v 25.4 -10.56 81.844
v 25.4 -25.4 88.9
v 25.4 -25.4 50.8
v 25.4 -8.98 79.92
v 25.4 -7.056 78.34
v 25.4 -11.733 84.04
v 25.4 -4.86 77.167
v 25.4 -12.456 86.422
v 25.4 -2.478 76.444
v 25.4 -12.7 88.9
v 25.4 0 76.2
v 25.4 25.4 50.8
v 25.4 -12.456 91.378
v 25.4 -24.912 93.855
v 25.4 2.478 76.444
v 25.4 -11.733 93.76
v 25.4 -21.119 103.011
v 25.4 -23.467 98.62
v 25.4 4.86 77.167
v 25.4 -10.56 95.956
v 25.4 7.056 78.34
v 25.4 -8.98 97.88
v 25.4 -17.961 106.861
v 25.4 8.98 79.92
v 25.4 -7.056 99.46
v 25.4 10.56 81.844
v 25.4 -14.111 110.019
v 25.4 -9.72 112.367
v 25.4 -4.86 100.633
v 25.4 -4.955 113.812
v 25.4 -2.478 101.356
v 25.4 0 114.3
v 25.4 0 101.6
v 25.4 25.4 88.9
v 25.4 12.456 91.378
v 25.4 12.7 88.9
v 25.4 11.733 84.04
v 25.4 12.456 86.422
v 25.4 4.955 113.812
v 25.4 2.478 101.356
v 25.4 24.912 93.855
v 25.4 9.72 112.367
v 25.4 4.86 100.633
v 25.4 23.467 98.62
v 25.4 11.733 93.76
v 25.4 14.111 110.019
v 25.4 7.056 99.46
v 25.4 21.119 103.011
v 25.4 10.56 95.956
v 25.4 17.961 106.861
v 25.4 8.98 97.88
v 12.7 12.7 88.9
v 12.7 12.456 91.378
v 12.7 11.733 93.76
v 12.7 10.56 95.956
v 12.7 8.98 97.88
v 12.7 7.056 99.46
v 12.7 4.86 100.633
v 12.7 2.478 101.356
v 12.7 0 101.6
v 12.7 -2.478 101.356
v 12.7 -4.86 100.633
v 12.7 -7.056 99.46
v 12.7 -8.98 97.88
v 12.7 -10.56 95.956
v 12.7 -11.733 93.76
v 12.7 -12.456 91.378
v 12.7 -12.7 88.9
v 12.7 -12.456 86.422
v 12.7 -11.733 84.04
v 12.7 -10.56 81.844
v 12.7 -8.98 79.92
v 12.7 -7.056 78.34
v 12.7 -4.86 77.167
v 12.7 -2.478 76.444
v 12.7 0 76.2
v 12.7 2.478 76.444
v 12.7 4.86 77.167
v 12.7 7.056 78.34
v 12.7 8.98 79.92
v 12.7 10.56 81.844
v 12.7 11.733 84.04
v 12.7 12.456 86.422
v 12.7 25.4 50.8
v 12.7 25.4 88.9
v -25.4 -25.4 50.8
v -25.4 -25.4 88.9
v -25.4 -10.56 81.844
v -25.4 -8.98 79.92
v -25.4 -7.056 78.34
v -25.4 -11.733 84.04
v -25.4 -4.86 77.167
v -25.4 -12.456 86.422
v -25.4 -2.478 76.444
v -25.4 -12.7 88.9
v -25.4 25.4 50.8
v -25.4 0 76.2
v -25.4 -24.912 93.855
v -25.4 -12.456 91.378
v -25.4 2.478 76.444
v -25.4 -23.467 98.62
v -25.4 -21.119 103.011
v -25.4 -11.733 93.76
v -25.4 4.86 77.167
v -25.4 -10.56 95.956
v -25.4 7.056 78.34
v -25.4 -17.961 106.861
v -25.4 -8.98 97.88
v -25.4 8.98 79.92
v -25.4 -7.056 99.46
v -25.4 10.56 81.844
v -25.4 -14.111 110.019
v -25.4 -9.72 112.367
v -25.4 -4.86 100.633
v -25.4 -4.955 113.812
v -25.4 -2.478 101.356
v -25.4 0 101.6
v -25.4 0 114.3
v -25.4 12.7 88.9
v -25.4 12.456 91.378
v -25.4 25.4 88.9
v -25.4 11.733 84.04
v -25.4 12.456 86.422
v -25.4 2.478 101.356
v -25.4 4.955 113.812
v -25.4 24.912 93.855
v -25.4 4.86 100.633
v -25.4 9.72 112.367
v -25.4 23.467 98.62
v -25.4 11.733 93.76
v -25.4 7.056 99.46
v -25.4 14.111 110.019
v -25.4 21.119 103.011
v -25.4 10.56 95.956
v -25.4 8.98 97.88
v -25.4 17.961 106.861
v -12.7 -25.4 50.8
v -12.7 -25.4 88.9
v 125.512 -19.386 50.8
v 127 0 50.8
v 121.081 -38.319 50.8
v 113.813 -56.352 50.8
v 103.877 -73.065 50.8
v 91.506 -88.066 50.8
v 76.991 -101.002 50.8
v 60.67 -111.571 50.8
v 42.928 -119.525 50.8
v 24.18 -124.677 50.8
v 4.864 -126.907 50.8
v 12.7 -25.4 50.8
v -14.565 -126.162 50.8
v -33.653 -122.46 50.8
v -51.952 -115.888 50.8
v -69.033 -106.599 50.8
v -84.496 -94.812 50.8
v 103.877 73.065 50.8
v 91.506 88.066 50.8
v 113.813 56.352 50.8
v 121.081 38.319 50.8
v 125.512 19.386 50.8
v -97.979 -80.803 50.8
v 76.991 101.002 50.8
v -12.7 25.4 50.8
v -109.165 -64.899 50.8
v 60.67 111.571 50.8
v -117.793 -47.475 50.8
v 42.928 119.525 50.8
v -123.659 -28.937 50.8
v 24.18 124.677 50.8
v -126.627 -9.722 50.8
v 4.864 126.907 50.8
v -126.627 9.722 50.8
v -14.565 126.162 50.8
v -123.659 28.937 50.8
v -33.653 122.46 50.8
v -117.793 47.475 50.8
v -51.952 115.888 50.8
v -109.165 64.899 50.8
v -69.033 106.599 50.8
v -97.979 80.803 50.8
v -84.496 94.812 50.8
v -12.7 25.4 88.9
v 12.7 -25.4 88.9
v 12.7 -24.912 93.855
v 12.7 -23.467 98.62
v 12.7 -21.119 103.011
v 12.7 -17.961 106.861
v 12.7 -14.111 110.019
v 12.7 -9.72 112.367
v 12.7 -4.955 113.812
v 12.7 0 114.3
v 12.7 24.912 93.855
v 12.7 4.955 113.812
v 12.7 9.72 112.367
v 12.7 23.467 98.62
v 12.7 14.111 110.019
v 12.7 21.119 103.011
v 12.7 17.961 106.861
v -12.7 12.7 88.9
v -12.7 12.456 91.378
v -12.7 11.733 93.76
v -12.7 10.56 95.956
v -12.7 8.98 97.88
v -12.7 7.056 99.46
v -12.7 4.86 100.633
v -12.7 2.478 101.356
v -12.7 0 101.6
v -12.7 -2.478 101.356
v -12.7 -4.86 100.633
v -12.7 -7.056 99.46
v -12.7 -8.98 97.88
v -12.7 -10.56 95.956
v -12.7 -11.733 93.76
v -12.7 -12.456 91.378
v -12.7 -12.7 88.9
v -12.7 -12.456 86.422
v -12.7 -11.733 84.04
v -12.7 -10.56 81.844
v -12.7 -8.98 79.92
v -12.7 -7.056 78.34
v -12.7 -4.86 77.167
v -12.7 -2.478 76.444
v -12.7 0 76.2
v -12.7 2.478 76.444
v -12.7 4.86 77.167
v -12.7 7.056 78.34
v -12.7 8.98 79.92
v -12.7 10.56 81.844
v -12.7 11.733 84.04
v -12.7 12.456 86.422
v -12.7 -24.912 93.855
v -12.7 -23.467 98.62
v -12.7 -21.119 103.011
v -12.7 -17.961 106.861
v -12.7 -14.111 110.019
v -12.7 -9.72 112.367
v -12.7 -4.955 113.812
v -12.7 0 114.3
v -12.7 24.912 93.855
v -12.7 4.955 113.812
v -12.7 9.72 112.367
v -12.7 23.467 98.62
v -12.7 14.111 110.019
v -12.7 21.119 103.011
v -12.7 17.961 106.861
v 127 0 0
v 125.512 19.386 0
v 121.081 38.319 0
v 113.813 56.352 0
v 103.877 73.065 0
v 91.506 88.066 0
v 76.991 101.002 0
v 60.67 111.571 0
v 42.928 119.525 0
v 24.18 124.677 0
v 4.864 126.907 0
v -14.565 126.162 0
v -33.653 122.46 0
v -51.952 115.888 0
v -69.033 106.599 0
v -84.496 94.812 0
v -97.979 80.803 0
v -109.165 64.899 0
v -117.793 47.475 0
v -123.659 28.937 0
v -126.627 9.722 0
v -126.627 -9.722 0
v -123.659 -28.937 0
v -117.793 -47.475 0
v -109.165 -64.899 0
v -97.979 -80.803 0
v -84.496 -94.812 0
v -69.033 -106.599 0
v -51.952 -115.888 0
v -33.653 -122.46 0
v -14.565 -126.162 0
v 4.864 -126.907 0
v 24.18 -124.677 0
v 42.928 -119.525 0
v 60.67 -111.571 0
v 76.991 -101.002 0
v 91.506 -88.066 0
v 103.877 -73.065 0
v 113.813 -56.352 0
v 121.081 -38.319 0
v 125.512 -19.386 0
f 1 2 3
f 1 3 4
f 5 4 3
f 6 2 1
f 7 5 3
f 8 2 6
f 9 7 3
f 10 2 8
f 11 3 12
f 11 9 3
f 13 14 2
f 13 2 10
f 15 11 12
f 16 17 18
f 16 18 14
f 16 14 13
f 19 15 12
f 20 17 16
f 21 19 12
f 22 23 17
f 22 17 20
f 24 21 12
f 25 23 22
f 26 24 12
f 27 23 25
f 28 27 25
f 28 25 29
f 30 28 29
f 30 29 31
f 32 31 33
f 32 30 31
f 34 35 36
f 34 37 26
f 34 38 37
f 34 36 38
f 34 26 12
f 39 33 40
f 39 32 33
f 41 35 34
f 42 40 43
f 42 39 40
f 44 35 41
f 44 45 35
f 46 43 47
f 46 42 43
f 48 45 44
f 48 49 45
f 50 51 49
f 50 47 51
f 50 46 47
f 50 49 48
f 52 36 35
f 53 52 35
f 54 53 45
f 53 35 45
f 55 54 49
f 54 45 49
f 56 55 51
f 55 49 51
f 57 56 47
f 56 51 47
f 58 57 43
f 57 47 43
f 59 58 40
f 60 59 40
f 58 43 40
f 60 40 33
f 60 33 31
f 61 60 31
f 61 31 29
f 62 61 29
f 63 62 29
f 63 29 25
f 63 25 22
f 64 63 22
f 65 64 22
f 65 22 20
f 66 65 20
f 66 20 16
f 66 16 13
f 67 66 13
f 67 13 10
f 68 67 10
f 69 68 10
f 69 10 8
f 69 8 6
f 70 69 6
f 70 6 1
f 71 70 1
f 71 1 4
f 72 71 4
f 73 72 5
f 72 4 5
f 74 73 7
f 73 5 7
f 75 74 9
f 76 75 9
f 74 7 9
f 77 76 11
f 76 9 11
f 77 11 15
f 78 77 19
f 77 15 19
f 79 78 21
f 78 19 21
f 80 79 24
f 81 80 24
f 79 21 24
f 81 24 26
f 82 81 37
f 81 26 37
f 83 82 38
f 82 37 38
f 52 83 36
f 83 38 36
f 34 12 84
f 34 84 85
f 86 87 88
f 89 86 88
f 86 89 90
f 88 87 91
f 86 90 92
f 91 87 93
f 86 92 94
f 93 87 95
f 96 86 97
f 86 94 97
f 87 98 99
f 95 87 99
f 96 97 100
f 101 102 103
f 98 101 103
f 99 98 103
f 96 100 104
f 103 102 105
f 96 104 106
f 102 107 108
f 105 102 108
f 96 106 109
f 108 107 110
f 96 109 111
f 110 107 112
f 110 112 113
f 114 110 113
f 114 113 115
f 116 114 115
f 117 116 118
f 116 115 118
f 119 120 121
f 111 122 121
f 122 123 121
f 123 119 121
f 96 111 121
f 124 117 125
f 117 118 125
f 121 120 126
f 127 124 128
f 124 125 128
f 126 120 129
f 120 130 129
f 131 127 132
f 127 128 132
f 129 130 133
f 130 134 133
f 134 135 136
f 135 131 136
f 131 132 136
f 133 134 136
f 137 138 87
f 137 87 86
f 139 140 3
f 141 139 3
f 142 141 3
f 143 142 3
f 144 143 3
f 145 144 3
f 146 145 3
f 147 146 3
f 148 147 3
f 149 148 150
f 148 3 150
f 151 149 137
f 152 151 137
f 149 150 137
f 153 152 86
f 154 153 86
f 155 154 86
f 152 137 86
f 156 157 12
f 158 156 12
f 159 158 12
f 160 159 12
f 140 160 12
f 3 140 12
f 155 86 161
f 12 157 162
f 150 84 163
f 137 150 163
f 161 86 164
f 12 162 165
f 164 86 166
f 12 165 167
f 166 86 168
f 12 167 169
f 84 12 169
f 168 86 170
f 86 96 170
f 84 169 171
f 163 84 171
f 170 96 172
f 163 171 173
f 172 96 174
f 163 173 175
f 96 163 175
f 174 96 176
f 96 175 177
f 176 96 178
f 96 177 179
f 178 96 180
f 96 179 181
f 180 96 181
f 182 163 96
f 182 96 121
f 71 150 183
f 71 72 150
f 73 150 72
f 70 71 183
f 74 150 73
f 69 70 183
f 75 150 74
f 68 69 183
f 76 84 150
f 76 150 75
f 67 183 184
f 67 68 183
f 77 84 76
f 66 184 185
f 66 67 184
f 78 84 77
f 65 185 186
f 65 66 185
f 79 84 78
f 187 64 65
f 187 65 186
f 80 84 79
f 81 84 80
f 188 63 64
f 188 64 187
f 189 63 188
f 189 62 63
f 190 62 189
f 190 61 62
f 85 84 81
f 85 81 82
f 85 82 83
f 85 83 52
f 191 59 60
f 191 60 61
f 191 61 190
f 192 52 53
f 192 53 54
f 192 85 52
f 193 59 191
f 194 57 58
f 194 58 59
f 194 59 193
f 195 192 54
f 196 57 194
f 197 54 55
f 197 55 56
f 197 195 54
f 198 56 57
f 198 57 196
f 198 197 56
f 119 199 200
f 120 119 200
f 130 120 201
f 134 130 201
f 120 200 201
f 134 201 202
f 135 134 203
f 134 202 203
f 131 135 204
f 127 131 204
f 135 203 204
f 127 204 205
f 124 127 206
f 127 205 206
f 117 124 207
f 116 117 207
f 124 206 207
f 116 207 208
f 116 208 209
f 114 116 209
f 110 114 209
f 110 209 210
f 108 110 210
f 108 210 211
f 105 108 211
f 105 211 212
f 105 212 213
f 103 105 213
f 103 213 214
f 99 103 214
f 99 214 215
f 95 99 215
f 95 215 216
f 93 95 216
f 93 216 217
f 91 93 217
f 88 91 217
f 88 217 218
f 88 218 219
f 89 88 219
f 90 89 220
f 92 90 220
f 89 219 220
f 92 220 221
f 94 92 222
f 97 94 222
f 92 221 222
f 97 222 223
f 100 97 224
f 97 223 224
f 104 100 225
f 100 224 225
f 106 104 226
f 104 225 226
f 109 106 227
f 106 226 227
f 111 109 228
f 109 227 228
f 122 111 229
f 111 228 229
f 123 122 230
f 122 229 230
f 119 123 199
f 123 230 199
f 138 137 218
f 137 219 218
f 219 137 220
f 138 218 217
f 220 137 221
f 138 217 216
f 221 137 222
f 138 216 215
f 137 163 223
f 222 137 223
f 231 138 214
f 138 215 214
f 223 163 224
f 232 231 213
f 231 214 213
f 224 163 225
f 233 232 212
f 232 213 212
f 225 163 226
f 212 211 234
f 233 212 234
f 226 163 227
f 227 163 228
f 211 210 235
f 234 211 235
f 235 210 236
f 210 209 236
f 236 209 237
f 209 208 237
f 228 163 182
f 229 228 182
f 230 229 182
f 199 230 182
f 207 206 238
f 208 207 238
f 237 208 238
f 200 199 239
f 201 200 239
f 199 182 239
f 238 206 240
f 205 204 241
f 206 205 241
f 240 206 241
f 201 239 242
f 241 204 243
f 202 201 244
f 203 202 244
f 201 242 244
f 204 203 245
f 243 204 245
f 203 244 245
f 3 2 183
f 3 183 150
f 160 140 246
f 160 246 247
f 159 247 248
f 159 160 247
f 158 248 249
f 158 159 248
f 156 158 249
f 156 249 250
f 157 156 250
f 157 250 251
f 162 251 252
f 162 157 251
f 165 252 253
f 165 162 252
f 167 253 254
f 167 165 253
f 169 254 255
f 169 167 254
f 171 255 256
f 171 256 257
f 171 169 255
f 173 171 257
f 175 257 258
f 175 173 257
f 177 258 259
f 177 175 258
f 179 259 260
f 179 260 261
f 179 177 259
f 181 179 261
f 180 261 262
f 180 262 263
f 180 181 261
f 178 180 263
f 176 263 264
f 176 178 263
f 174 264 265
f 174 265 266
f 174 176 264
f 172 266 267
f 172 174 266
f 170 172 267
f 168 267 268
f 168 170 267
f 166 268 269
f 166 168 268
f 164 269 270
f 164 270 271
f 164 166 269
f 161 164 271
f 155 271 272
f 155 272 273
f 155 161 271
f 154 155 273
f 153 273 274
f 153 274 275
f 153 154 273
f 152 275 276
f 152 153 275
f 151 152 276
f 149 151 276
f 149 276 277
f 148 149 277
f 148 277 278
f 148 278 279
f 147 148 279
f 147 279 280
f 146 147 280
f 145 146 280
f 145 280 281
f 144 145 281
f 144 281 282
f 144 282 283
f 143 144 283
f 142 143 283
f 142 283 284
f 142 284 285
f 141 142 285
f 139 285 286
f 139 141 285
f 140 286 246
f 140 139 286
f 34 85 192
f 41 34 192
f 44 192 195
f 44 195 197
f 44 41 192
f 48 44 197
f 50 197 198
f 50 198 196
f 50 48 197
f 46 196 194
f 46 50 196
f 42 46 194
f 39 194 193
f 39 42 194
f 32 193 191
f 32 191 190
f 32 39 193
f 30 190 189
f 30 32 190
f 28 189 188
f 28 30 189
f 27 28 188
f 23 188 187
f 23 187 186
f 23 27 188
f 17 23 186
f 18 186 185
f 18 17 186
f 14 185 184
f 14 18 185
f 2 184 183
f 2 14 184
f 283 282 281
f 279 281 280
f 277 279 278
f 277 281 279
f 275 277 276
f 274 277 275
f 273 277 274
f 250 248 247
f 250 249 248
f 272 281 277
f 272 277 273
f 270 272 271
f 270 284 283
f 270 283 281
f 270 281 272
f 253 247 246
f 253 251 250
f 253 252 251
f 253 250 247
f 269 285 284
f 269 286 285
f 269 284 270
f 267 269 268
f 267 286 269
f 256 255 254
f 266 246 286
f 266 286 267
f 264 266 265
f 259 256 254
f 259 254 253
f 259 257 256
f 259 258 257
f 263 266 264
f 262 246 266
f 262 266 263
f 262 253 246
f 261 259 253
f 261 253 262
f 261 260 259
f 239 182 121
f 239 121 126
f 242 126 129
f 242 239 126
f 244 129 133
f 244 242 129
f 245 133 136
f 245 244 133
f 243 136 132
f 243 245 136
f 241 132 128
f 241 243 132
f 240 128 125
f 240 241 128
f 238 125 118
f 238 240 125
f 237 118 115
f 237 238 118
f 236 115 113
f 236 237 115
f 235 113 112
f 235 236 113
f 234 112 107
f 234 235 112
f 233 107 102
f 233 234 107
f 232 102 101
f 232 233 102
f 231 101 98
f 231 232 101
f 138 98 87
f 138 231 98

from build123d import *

# Parameters (mm, degrees)
F0_W     = 127
F0_H     = 50.8
F3_DEPTH = 25.4
F4_W     = 25.4
F4_H     = 101.6
F5_DEPTH = 152.401
F6_R     = 12.7
F7_DEPTH = 152.401


with BuildPart() as f1:
    # F0 (on Front) → F1 (revolve)
    with BuildSketch(Plane.XZ):
        with Locations((63.5, 25.4)):
            Rectangle(F0_W, F0_H)
    revolve(axis=Axis((0, 0, 25.4), (0, 0, 1)))

    # F2 (on Right) → F3 (join, symmetric)
    with BuildSketch(Plane.YZ):
        with BuildLine():
            Line((-25.4, 88.9), (-25.4, 50.8))
            Line((-25.4, 50.8), (25.4, 50.8))
            Line((25.4, 50.8), (25.4, 88.9))
            ThreePointArc((25.4, 88.9), (0, 114.3), (-25.4, 88.9))
        make_face()
    extrude(amount=F3_DEPTH, both=True)

    # F4 (on face) → F5 (cut, through all)
    with BuildSketch(Plane(origin=(0, 25.4, 0), x_dir=(-1, 0, 0), z_dir=(0, 1, 0))):
        with Locations((0, 101.6)):
            Rectangle(F4_W, F4_H)
    extrude(amount=-F5_DEPTH, mode=Mode.SUBTRACT)

    # F6 (on face) → F7 (cut, through all)
    with BuildSketch(Plane.YZ.offset(25.4)):
        with Locations((0, 88.9)):
            Circle(F6_R)
    extrude(amount=-F7_DEPTH, mode=Mode.SUBTRACT)


solid = f1.part
